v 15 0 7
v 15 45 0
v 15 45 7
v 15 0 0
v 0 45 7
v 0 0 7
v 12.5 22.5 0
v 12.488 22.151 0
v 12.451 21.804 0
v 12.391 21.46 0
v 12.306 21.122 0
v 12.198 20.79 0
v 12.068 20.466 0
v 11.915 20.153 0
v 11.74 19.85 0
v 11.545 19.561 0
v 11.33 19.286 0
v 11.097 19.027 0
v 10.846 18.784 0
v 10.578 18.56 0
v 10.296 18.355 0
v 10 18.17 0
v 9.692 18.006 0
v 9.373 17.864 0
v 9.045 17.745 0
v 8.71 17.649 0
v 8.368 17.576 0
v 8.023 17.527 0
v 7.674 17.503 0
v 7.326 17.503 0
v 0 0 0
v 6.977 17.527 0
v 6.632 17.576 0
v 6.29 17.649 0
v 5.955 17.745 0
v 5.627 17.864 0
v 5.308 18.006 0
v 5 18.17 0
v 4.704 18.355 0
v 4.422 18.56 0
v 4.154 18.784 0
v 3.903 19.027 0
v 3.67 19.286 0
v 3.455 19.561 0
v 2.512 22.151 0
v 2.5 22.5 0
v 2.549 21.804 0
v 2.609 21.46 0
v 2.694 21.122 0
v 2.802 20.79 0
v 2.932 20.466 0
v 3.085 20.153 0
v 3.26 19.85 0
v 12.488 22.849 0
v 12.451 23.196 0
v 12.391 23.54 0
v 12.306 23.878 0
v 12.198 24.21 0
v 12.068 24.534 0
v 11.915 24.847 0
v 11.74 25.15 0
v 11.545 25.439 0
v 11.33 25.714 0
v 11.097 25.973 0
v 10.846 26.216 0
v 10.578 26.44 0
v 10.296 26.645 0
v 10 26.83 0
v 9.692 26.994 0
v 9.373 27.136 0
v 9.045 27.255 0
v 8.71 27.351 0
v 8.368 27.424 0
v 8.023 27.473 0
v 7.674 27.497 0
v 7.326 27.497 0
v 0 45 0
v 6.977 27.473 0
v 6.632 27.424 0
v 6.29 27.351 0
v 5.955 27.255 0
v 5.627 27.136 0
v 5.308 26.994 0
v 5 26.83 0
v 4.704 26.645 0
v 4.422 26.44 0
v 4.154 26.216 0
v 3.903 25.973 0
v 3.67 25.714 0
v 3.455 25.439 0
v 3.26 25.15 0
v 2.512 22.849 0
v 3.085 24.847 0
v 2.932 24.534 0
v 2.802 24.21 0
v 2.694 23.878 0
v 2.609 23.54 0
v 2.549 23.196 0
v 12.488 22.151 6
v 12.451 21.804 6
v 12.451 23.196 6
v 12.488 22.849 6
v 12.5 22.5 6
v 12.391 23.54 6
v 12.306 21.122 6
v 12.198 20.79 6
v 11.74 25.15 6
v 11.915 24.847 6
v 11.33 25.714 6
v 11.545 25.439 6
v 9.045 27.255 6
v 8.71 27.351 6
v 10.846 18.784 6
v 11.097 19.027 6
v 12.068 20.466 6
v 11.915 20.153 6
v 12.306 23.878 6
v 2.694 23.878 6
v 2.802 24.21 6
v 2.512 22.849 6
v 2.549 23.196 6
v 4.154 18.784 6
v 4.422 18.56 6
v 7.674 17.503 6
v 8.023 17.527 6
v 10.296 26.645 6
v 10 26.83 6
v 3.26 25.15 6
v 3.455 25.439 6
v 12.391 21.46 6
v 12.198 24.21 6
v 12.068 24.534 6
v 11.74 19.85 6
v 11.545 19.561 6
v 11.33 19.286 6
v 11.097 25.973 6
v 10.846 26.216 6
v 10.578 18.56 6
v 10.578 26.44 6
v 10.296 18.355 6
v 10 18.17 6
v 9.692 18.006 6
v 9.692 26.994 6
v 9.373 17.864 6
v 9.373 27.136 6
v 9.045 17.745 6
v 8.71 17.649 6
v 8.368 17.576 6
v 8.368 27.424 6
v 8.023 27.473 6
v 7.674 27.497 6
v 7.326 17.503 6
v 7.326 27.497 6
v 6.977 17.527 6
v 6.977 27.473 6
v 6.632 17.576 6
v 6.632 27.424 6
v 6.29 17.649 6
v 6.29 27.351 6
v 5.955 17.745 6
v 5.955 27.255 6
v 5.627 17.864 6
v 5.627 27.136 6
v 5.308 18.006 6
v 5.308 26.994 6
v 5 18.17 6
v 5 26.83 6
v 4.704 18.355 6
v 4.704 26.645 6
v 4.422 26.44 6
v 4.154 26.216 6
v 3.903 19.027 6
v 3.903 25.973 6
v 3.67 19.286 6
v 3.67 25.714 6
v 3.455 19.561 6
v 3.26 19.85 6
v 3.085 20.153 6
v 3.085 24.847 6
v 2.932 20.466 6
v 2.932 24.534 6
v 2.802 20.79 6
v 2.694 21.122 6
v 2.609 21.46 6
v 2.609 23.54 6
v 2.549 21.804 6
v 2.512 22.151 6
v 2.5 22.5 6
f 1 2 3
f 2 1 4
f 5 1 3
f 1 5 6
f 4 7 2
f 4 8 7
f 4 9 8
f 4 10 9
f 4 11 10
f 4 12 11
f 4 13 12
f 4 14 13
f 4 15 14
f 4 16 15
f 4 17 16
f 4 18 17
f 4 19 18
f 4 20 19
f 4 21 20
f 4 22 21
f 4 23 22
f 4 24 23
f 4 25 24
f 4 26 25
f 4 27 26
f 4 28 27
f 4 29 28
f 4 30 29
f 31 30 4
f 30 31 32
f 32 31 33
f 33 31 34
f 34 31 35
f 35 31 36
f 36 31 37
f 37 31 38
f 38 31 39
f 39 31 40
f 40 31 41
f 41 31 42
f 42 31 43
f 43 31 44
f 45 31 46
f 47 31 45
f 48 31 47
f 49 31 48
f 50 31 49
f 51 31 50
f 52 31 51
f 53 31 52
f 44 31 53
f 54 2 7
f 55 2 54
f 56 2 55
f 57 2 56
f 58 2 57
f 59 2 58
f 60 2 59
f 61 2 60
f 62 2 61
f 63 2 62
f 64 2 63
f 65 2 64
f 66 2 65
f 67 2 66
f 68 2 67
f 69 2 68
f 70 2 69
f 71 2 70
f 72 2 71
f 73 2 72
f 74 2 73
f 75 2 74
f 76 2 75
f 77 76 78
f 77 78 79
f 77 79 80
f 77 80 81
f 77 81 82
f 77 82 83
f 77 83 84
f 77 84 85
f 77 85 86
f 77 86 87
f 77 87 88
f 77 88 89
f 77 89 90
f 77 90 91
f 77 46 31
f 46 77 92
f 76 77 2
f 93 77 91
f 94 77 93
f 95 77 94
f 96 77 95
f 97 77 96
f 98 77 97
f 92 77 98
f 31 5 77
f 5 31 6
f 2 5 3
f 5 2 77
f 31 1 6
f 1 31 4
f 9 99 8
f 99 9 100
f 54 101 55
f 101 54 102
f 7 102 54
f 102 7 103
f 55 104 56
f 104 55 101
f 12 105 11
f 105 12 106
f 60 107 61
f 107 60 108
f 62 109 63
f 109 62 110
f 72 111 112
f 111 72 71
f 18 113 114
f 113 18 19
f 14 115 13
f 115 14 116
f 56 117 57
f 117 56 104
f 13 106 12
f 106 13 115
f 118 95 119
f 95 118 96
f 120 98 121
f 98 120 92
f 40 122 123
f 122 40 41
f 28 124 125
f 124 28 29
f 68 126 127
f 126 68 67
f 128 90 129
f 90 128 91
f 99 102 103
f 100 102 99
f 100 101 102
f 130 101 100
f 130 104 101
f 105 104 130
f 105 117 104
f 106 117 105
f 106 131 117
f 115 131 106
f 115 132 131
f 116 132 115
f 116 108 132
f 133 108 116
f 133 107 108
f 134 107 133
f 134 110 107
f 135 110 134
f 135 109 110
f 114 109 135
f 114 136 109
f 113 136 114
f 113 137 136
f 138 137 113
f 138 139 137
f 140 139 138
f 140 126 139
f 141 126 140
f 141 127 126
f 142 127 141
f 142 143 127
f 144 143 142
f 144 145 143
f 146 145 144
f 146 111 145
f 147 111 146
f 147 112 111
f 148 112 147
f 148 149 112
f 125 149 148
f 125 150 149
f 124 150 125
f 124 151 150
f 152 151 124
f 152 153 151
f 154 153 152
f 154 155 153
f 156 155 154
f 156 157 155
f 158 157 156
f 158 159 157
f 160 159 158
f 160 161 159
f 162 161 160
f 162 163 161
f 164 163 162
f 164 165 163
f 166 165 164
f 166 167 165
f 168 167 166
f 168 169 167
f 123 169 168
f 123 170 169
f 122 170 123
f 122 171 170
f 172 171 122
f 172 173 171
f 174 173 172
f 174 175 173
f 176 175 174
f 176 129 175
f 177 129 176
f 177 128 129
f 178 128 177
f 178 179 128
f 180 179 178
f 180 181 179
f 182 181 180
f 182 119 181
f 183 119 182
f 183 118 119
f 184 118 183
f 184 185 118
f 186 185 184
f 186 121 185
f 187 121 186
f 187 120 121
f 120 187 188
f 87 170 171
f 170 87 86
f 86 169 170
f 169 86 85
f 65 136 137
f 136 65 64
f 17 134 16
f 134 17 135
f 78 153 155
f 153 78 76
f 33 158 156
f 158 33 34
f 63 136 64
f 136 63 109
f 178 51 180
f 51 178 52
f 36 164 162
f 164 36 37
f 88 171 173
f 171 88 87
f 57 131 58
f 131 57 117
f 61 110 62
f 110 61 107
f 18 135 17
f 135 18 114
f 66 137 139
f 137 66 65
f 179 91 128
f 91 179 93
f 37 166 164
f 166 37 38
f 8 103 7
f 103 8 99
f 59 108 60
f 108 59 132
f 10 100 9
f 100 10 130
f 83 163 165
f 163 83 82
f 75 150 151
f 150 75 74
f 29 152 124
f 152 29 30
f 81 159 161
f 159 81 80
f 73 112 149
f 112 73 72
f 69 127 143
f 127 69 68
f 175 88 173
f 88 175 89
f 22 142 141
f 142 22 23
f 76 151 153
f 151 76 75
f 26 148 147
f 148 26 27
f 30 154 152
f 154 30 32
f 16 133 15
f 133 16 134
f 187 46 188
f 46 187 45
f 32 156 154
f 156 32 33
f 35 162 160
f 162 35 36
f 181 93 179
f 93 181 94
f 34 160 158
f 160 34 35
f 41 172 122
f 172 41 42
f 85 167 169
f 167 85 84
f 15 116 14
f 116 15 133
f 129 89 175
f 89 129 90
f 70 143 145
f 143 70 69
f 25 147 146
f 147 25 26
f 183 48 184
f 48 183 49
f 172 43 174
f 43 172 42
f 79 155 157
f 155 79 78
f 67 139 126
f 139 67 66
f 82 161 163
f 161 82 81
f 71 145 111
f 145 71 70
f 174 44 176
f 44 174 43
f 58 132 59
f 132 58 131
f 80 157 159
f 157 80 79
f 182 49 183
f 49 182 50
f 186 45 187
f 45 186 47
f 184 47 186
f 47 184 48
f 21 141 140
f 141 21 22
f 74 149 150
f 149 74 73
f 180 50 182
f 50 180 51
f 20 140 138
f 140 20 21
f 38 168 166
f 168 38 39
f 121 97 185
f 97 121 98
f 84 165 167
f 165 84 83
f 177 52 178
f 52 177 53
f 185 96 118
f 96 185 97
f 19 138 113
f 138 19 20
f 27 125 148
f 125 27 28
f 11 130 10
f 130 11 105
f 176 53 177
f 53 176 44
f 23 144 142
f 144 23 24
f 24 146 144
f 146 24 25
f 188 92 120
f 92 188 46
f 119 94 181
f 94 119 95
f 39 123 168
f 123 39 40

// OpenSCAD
$fa=4; // default minimum facet angle is now 0.5
$fs=0.05; // default minimum facet size is now 0.05 mm

difference () {
  cube([15, 45, 7]);
  translate([7.5, 22.5, ]) cylinder(r = 5, h = 6);
}
